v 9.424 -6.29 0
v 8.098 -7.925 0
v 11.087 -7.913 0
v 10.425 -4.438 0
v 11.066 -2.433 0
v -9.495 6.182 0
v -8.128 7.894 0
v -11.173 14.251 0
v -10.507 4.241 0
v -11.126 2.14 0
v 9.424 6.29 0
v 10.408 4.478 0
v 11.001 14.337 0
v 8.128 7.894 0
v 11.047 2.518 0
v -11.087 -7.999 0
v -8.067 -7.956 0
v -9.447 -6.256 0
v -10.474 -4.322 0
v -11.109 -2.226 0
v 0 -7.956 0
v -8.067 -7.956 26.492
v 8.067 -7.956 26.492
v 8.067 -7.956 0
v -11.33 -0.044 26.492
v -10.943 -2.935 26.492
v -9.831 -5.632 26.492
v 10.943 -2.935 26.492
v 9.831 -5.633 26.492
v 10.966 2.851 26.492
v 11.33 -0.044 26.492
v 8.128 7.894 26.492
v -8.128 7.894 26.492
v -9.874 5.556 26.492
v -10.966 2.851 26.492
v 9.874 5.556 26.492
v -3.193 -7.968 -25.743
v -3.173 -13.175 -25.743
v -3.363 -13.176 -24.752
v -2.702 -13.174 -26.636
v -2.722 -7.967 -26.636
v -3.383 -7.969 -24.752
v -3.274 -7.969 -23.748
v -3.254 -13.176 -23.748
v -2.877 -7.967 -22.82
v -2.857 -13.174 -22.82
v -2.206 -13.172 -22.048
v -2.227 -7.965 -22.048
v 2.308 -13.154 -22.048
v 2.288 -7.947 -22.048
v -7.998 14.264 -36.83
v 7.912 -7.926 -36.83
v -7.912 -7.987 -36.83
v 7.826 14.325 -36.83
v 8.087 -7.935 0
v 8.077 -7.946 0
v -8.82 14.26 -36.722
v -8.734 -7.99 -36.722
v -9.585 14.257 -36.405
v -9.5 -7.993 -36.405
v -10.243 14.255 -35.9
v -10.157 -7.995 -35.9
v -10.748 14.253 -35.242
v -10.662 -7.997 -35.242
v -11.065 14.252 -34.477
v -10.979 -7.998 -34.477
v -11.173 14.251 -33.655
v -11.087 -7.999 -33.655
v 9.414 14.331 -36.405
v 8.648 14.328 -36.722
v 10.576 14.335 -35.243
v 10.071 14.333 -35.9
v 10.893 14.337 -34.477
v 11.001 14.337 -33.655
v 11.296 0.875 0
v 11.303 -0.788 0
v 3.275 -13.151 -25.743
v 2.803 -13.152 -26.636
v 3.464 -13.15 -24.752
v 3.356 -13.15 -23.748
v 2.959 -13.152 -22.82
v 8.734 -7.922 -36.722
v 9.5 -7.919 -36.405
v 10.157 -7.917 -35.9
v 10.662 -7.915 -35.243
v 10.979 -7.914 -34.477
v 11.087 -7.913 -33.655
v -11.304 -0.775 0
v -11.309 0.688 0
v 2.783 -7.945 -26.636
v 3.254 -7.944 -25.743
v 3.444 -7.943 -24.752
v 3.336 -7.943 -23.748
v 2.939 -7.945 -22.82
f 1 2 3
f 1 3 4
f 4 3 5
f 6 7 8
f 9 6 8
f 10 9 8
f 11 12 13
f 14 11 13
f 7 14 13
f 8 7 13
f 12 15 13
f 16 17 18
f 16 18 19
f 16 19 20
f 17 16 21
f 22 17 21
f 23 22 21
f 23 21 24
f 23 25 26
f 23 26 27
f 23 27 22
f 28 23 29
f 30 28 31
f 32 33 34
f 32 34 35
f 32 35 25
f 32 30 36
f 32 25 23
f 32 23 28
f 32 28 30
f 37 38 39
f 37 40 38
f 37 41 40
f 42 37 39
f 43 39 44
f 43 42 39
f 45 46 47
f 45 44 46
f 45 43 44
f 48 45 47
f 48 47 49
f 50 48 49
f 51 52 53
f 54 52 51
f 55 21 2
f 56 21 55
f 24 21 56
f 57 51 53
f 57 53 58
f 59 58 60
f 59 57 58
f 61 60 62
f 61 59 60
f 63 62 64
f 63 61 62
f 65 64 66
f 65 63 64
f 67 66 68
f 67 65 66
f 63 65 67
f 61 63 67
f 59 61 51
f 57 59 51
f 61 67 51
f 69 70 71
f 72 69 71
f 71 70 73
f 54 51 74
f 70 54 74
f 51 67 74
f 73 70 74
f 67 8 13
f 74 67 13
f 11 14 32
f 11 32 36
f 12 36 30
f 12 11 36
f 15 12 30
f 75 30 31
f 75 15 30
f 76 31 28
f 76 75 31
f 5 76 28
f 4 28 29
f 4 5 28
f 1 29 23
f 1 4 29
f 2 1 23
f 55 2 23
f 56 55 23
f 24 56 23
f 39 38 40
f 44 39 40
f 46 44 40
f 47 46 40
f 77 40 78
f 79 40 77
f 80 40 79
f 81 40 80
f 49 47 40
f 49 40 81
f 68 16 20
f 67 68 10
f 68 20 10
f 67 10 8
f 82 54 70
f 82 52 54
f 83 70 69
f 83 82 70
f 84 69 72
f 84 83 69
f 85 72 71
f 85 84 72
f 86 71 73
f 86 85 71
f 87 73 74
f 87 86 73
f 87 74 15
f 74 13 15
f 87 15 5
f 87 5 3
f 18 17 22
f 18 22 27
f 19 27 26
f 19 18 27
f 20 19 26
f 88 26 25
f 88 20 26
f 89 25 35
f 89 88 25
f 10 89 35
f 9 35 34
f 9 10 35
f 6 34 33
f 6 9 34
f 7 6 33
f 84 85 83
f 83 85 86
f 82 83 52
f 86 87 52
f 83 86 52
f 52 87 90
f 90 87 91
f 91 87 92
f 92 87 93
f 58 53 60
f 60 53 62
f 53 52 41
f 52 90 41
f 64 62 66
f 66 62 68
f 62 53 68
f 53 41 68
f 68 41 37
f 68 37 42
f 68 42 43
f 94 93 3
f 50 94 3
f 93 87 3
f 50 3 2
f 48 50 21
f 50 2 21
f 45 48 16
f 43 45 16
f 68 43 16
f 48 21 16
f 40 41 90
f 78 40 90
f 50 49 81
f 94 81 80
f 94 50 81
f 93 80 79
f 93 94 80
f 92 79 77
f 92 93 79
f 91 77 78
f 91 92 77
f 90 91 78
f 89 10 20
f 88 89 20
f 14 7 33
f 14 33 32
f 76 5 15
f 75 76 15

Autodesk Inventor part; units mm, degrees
ref_plane "YZ Plane" through (0, 0, 0) normal (1, 0, 0) x (0, 1, 0)
ref_plane "XZ Plane" through (0, 0, 0) normal (0, 1, 0) x (-1, 0, 0)
ref_plane "XY Plane" through (0, 0, 0) normal (0, 0, 1) x (1, 0, 0)
sketch "Sketch1" plane through (0, 0, 0) normal (0, 0, 1) x (1, 0, 0)
  line L0 (-8.128, 7.8935) -> (8.128, 7.8935)
  line L1 (-8.0668, -7.9561) -> (8.0668, -7.9561)
  arc A0 (-8.128, 7.8935) -> (-8.0668, -7.9561) centre (0, 0) ccw
  arc A1 (8.0668, -7.9561) -> (8.128, 7.8935) centre (0, 0) ccw
  line L2 (0, 7.8935) -> (0, -7.9561)
  dimension "d8" = 15.8496
  dimension "d9" = 16.256
extrude "Extrusion1" add sketch "Sketch1" along normal blind 26.4922
sketch "Sketch2" plane through (0, 0, 0) normal (0, 0, -1) x (-0.0038611, 0.9999925, 0)
  line L0 (-7.956, -11.1178) -> (14.2944, -11.1178)
  line L1 (14.2944, -11.1178) -> (14.2944, 11.0564)
  line L2 (14.2944, 11.0564) -> (-7.956, 11.0564)
  line L3 (-7.956, 11.0564) -> (-7.956, -11.1178)
  line L4 (-4.7868, -0.0614) -> (-7.956, -0.0307)
  point P0 (0, 0)
  dimension "d3" = 22.2504
  dimension "d4" = 22.1742
extrude "Extrusion2" add sketch "Sketch2" along normal blind 36.83
fillet "Fillet1" radius 3.175 2 edges at (-11.13, 3.1262, -36.83) (11.0441, 3.2119, -36.83)
sketch "Sketch4" plane through (0, 0, 26.4922) normal (0, 0, 1) x (0.0038611, -0.9999925, 0)
  point P0 (0, 0)
  point P1 (-14.2944, -11.1178)
sketch "Sketch6" plane through (11.087, -7.9133, -33.655) normal (0.0038611, -0.9999925, 0) x (0.9999925, 0.0038611, 0)
  line L0 (-13.3136, 11.6068) -> (-8.7992, 11.6068)
  line L1 (-13.8088, 7.0188) -> (-8.3039, 7.0188)
  arc A0 (-13.3136, 11.6068) -> (-13.8088, 7.0188) centre (-11.0564, 9.0424) ccw
  arc A1 (-8.3039, 7.0188) -> (-8.7992, 11.6068) centre (-11.0564, 9.0424) ccw
  point P0 (-11.0564, 33.655)
extrude "Extrusion3" add sketch "Sketch6" along normal blind 5.207
properties part number "cwmotor"
